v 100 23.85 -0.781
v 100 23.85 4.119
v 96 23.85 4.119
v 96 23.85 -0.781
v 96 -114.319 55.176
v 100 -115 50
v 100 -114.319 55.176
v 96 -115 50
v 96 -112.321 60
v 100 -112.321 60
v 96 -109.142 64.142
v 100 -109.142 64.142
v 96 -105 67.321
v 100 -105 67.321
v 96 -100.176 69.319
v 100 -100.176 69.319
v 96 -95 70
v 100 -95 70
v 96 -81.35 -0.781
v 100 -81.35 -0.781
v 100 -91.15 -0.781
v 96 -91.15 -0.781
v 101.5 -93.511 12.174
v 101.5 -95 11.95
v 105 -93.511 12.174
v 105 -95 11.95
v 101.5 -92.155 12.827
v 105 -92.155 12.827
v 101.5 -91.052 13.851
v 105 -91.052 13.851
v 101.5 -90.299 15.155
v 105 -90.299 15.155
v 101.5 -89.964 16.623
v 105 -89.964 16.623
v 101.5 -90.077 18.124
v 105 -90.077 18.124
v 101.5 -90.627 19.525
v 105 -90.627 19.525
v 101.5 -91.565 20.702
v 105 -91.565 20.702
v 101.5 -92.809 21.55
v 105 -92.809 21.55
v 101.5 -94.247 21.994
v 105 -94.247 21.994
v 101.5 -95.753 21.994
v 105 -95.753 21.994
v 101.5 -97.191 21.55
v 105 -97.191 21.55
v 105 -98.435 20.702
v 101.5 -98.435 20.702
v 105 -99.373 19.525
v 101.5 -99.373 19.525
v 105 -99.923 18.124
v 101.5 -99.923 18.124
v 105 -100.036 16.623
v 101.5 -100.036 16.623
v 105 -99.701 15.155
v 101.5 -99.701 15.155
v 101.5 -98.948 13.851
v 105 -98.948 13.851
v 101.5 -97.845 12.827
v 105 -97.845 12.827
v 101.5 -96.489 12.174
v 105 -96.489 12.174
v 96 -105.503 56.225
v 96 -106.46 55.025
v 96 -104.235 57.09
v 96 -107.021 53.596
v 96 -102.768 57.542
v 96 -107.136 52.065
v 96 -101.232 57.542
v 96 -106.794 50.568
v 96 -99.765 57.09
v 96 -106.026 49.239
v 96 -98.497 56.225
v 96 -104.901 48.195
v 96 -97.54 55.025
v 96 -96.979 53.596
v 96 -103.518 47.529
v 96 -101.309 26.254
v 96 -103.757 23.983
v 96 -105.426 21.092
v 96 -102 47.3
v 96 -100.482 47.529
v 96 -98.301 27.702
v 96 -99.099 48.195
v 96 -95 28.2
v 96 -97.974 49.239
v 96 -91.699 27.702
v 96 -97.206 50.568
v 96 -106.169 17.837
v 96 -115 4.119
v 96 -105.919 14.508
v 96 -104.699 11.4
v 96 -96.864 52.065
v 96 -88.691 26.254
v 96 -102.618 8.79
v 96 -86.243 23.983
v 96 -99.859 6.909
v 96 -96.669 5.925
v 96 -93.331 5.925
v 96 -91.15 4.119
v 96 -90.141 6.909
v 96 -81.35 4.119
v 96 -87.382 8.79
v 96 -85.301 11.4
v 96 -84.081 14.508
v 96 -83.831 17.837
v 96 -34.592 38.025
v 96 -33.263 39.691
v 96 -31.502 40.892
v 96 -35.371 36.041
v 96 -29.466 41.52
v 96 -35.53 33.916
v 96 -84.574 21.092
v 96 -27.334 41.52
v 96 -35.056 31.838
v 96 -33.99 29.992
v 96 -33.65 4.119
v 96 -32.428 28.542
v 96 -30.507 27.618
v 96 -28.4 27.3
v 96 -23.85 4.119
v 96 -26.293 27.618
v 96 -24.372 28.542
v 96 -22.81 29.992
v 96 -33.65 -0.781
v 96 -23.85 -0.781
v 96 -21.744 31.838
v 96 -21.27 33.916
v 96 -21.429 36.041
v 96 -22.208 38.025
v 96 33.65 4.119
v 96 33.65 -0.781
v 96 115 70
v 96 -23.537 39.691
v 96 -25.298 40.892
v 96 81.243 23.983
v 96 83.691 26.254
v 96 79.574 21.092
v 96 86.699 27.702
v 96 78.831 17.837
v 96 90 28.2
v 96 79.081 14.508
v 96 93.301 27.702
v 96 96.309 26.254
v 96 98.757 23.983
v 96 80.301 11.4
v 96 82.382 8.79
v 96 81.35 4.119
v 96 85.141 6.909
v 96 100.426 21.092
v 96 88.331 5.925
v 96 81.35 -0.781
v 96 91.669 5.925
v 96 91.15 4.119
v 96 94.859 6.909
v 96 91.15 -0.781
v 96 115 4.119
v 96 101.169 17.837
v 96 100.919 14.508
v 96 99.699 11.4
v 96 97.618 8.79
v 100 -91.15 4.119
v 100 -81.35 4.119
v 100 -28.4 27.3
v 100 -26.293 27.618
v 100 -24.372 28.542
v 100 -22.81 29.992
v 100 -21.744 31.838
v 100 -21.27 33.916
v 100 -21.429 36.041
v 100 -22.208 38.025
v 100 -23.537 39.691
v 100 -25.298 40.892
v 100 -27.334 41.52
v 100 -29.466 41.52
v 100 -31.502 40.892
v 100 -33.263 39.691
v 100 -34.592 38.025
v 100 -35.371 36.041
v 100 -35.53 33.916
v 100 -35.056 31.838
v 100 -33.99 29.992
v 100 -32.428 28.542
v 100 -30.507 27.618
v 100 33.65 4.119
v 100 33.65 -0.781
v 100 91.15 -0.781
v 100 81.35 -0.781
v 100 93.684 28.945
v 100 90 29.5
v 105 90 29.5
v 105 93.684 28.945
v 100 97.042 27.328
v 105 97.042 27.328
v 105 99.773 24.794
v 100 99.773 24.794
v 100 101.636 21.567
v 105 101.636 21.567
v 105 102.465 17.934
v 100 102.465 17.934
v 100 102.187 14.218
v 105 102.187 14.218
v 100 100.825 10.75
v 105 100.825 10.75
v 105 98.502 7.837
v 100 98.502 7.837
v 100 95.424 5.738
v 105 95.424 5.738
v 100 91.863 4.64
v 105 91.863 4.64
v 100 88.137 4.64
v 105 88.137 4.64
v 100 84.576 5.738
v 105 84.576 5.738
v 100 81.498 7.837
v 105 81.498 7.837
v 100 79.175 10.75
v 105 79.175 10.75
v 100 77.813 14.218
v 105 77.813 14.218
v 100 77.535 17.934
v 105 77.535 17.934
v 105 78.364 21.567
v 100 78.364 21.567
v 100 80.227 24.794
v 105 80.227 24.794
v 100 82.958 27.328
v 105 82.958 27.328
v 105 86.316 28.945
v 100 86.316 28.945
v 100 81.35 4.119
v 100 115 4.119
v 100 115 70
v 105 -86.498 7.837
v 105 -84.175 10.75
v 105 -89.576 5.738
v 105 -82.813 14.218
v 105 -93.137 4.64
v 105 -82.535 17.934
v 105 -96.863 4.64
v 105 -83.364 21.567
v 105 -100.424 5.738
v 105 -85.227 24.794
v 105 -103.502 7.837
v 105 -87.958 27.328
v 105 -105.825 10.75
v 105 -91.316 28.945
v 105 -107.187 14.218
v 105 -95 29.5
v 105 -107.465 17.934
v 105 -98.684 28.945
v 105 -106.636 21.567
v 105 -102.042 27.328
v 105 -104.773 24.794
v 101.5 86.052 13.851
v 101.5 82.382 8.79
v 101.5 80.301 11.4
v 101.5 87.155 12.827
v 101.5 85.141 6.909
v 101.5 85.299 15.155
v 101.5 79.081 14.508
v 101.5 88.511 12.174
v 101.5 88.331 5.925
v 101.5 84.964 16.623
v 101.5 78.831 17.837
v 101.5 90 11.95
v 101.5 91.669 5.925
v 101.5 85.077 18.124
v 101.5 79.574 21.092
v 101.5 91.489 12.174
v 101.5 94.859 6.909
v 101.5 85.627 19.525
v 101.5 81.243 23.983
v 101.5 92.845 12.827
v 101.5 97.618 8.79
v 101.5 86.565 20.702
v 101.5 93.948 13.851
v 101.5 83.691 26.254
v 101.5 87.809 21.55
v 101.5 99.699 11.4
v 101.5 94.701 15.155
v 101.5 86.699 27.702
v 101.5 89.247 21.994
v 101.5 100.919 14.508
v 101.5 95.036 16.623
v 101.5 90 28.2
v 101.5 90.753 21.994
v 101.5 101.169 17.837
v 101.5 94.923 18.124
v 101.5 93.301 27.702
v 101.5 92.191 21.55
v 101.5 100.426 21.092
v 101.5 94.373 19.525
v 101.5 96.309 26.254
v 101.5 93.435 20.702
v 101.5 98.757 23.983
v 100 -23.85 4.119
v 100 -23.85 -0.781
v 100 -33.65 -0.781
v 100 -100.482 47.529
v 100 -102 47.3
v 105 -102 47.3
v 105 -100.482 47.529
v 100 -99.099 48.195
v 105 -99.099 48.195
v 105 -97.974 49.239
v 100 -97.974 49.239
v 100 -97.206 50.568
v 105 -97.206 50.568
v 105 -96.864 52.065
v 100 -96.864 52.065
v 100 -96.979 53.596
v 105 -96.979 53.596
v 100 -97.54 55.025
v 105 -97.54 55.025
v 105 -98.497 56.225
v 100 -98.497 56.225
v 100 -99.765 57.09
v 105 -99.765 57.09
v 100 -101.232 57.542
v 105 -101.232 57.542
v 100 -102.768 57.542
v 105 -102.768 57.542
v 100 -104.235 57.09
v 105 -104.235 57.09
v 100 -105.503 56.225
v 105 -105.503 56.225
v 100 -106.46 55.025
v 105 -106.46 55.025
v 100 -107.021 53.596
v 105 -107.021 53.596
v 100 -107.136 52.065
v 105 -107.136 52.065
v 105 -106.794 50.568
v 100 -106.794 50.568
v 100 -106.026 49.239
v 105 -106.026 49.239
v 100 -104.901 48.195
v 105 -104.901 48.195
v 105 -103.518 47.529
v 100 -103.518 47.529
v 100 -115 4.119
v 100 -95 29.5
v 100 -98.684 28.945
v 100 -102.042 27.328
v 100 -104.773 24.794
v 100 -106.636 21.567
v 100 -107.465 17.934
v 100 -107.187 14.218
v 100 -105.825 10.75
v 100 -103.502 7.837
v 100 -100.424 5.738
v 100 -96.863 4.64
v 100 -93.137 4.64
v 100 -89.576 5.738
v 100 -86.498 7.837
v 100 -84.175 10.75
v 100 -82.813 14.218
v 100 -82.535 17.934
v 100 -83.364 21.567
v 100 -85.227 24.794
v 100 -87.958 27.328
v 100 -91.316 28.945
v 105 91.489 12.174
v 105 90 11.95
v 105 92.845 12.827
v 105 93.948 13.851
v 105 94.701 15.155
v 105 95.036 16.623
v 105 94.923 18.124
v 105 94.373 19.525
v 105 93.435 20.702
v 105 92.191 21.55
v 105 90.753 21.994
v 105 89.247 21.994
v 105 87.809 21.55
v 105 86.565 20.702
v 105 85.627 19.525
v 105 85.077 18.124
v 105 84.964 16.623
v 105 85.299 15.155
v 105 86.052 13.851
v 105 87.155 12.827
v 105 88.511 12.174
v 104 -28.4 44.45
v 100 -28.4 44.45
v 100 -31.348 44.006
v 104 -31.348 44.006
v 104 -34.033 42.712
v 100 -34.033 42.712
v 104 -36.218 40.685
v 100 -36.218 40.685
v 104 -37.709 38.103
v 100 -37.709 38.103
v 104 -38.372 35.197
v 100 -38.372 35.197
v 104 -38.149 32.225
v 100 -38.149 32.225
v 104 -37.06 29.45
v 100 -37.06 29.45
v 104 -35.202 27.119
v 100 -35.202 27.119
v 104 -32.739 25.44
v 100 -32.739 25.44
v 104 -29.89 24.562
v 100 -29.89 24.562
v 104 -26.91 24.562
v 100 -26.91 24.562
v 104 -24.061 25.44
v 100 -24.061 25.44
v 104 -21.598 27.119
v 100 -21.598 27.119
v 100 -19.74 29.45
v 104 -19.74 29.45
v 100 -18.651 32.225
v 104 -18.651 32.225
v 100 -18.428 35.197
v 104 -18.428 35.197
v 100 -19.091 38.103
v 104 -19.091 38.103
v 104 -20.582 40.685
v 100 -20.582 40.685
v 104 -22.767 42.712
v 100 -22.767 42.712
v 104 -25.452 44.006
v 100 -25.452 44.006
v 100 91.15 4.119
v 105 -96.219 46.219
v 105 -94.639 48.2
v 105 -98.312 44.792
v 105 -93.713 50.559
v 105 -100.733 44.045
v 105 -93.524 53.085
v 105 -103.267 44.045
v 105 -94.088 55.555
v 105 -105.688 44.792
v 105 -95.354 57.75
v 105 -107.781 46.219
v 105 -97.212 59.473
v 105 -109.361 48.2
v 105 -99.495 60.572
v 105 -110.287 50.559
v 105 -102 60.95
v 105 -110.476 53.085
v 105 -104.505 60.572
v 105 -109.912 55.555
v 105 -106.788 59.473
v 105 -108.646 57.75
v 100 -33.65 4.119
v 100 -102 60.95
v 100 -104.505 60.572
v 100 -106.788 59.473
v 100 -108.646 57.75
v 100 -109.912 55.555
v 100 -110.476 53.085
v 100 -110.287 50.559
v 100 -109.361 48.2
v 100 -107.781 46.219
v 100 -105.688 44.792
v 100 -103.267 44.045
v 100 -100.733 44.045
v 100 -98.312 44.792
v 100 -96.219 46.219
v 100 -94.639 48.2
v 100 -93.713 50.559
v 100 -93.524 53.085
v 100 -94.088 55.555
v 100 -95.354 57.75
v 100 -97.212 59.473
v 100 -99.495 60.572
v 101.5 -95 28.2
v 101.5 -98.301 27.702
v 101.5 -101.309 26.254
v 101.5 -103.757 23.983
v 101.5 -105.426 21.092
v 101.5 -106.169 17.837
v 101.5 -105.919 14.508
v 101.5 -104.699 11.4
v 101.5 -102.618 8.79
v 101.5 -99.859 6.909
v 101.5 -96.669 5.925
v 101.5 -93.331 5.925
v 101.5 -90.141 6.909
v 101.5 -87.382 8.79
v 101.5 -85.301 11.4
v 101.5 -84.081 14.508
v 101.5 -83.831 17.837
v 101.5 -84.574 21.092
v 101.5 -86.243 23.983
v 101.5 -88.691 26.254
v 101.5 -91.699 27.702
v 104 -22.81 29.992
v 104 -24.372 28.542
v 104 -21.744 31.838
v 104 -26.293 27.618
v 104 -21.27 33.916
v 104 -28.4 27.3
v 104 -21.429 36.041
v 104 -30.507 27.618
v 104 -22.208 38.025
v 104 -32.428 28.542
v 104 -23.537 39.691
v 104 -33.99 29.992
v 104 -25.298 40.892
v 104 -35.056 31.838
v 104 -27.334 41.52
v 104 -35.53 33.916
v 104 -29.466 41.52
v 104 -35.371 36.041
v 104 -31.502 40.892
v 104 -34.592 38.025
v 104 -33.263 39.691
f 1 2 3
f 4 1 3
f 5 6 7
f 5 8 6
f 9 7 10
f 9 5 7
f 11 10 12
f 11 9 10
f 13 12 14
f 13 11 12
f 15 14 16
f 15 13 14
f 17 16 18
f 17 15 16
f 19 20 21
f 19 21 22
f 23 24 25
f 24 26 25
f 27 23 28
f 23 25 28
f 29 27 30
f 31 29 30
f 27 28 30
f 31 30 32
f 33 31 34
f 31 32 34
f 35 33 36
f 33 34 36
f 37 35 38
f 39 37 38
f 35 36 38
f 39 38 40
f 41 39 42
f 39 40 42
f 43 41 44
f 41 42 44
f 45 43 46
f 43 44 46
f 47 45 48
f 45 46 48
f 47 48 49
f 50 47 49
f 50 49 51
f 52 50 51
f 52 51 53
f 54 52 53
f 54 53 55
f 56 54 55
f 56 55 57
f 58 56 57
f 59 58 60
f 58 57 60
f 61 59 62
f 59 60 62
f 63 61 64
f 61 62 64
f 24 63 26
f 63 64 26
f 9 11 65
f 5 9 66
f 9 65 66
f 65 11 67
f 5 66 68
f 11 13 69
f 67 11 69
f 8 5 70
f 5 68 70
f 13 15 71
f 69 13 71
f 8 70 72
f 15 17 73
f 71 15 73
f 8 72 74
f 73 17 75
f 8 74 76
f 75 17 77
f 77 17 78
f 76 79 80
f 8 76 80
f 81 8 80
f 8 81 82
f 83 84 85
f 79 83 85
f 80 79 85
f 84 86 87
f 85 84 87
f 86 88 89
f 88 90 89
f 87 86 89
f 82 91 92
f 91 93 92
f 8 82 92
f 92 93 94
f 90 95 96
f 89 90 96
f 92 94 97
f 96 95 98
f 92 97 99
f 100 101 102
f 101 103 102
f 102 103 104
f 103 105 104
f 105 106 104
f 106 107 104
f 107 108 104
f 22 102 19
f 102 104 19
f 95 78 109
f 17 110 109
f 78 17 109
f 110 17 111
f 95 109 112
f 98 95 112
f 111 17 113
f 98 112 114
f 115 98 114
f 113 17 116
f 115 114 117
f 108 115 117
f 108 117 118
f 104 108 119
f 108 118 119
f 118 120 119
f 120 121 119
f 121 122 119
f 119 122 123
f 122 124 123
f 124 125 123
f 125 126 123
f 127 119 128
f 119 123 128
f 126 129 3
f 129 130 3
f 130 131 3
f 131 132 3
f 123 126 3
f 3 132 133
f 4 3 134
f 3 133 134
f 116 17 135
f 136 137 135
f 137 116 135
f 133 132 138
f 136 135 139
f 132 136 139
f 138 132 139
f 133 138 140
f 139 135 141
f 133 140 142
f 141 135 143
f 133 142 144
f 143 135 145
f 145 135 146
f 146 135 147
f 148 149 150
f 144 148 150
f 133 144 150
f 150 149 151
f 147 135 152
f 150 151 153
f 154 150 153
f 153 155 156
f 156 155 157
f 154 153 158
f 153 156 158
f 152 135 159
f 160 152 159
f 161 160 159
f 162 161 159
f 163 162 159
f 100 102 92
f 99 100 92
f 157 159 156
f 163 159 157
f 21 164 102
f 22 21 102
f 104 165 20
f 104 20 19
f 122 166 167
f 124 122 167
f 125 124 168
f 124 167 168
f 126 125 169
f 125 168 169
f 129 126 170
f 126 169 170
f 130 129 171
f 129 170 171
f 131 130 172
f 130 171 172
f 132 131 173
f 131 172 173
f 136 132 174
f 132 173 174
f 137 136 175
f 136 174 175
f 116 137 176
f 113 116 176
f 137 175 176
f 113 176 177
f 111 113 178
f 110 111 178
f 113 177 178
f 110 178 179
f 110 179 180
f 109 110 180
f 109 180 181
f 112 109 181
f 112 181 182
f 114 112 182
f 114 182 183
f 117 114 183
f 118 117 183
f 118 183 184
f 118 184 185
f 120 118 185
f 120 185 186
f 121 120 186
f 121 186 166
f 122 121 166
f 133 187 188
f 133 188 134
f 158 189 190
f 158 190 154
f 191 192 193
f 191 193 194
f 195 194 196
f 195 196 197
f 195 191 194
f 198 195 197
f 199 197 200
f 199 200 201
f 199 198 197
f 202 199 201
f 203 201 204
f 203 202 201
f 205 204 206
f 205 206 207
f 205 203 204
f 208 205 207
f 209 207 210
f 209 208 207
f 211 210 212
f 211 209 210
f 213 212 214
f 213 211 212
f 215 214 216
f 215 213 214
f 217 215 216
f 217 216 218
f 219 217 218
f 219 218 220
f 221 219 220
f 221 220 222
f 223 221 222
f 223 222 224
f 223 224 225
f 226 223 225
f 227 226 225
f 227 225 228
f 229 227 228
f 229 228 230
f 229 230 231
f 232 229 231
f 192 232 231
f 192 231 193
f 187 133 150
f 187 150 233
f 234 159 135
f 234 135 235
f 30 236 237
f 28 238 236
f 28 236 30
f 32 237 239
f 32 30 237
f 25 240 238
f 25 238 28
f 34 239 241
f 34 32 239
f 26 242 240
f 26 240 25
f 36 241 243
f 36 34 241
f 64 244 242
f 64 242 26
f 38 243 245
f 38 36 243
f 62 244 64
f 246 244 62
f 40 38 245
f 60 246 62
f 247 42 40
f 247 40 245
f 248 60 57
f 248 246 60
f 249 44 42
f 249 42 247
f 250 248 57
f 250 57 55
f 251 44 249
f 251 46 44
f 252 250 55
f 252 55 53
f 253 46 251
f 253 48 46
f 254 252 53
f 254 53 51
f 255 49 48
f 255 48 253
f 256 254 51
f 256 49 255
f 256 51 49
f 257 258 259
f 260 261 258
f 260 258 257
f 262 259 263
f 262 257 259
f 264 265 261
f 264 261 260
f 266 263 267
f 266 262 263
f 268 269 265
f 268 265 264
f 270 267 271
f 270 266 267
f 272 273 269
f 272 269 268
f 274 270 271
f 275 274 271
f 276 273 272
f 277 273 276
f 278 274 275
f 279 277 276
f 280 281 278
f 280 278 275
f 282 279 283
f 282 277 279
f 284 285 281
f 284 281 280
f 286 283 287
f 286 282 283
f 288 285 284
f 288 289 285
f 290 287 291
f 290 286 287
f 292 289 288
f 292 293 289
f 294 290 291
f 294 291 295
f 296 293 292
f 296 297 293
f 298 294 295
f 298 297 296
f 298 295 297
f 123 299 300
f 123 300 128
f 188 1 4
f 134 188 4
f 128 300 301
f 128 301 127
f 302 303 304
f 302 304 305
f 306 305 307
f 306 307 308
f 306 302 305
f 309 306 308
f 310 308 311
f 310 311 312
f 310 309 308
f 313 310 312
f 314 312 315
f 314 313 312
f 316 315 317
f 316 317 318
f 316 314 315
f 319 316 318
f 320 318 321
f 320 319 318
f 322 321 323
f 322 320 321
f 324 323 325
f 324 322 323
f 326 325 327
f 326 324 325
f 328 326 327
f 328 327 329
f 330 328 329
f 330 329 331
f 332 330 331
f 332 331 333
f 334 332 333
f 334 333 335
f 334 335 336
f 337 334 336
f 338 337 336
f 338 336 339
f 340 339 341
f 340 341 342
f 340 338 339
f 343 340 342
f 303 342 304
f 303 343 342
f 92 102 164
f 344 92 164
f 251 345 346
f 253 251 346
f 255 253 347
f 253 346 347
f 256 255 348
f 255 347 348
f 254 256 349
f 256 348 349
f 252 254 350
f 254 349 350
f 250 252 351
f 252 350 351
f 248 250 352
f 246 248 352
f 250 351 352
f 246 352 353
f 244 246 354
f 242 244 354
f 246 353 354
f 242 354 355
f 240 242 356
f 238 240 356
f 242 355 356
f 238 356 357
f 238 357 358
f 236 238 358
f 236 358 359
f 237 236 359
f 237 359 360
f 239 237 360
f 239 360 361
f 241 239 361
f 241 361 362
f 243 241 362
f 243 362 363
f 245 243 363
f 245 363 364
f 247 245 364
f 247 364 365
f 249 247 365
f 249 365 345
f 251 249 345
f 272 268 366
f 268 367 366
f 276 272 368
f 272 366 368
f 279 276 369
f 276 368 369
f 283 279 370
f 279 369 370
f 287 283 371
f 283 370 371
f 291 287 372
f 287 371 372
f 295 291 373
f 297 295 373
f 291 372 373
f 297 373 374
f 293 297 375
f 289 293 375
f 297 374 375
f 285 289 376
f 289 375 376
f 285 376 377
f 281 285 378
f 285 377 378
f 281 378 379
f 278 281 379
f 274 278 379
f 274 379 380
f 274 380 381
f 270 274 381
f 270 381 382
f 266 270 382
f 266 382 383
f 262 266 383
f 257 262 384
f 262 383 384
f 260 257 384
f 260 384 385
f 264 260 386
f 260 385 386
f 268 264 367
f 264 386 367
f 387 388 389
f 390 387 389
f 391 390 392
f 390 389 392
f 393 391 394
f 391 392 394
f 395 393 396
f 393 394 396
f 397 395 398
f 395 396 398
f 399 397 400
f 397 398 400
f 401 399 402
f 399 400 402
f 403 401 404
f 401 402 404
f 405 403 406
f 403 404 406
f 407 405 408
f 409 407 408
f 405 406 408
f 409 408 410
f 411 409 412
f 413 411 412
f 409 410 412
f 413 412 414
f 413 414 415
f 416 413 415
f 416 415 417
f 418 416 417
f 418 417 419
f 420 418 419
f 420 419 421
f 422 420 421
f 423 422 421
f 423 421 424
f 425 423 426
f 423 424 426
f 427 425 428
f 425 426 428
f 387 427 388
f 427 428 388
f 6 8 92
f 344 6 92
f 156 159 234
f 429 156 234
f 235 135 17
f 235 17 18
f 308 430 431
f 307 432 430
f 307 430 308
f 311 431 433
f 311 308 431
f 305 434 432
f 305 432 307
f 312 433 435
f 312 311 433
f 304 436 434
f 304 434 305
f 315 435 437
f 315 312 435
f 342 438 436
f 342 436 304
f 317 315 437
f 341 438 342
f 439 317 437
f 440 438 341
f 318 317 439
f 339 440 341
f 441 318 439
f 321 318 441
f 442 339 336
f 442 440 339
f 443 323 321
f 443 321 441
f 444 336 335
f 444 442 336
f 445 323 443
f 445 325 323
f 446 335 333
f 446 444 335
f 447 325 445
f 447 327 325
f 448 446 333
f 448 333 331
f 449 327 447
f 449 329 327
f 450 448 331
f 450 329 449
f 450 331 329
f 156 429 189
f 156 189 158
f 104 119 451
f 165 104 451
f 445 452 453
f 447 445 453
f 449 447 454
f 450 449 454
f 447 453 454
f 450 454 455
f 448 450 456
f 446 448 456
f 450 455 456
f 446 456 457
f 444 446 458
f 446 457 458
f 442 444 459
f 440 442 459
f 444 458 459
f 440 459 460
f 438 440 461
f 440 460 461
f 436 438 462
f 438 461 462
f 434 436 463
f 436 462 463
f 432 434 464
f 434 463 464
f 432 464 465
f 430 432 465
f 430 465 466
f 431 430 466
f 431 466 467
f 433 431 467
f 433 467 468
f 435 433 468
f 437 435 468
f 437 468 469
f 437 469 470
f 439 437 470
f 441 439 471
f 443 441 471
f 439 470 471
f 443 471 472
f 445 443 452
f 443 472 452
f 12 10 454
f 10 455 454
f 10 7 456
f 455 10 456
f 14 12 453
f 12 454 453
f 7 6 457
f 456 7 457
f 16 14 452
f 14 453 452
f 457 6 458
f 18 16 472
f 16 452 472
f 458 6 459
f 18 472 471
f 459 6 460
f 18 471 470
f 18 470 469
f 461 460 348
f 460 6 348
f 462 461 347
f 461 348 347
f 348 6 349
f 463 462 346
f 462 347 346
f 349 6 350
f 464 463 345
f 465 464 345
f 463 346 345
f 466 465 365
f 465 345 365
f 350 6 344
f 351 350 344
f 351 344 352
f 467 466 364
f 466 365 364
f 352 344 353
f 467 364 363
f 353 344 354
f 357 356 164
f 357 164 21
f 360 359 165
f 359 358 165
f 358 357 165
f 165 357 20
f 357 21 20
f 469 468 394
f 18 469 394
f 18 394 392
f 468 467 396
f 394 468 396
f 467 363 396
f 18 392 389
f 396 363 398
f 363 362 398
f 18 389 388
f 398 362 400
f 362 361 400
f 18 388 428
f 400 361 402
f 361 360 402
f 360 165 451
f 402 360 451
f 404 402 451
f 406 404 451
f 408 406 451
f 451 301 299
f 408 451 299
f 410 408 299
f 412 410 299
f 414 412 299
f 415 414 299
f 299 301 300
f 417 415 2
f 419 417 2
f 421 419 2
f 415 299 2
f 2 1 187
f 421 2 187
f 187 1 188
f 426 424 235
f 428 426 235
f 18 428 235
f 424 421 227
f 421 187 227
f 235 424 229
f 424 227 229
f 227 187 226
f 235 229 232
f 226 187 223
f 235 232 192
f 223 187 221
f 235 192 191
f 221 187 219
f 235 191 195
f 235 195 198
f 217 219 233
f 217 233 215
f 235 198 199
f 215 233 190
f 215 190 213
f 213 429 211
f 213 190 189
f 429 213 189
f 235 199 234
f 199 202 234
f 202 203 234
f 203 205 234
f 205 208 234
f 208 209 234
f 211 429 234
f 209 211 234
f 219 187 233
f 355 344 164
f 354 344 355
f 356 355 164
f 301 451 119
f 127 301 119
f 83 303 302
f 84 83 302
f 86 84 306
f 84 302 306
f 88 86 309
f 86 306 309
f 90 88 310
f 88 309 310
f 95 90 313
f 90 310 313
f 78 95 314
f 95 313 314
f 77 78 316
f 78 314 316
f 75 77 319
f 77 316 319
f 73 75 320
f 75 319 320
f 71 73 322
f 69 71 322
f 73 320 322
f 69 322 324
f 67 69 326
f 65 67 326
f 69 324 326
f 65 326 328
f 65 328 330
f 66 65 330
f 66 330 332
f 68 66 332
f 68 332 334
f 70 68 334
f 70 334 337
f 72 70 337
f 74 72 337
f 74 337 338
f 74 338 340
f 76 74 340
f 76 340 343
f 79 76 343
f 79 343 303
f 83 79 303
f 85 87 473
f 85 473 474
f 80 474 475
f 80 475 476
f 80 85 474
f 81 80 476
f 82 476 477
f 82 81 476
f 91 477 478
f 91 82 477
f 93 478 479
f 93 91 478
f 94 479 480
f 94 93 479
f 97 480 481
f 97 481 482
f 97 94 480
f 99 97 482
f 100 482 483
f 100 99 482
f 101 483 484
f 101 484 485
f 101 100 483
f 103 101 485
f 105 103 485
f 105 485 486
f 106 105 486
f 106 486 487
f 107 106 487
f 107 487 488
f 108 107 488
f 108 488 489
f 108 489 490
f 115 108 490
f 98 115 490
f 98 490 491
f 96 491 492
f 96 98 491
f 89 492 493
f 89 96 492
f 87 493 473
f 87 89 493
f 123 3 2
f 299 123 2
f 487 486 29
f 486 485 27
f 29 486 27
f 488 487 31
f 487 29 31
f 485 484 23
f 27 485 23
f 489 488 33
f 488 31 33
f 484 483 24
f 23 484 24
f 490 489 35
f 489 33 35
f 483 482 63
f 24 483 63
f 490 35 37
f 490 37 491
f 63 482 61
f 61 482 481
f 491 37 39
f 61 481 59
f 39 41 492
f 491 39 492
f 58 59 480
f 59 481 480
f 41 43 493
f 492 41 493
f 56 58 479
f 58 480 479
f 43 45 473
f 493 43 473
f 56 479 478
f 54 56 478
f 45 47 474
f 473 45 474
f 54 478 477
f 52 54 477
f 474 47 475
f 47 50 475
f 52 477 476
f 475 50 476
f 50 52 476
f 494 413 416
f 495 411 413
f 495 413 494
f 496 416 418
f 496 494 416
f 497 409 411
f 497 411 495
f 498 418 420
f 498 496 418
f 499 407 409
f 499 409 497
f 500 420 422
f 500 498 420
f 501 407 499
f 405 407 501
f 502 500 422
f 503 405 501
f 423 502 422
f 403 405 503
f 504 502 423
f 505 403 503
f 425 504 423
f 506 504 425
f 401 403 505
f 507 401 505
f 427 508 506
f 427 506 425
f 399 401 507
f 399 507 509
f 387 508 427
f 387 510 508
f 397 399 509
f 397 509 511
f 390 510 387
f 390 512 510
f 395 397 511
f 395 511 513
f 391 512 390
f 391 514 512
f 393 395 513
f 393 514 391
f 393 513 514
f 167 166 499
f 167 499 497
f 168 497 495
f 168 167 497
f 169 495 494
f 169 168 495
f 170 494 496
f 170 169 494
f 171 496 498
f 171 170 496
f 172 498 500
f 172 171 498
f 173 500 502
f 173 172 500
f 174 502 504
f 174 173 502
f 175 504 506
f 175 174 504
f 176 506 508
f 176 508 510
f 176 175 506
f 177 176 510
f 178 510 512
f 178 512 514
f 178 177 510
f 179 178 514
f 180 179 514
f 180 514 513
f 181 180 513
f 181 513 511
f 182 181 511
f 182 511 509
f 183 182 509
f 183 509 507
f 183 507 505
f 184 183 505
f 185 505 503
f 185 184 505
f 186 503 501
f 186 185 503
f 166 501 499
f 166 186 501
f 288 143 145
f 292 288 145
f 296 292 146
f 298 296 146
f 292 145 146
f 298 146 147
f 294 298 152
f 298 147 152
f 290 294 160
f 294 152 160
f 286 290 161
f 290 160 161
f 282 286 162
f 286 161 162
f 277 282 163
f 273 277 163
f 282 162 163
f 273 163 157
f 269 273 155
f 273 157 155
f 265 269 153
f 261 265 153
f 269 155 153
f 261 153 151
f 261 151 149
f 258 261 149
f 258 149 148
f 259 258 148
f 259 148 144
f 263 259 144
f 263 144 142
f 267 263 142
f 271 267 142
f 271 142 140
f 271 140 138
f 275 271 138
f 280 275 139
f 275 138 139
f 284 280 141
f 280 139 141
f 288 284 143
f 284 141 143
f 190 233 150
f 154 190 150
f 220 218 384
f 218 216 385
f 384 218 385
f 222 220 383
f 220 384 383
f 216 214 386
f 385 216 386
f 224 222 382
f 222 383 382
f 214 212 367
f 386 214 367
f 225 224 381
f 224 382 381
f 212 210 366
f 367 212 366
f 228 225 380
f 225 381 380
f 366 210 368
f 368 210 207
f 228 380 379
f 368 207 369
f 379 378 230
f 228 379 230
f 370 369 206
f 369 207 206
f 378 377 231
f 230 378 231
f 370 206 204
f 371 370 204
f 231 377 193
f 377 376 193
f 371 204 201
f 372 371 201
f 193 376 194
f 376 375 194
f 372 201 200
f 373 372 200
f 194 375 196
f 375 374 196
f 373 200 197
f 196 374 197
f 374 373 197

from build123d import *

# Parameters (mm, degrees)
SKETCH1_W            = 200
SKETCH1_H            = 230
BOSS_EXTRUDE1_DEPTH  = 70
SKETCH2_W            = 192
SKETCH2_H            = 222
CUT_EXTRUDE1_DEPTH   = 66
SKETCH4_W            = 196
SKETCH4_H            = 25
CUT_EXTRUDE3_DEPTH   = 10
SKETCH10_R           = 5
CUT_EXTRUDE8_DEPTH   = 167.075284133
SKETCH11_W           = 2
SKETCH11_H           = 10
BOSS_EXTRUDE2_DEPTH  = 20
SKETCH12_W           = 2
SKETCH12_H           = 5
CUT_EXTRUDE9_DEPTH   = 20
FILLET1_R            = 2.5
SKETCH13_W           = 2
SKETCH13_H           = 10
BOSS_EXTRUDE3_DEPTH  = 20
SKETCH14_W           = 2
SKETCH14_H           = 5
CUT_EXTRUDE10_DEPTH  = 20
FILLET2_R            = 2.5
SKETCH15_W           = 192
SKETCH15_H           = 66
CUT_EXTRUDE11_DEPTH  = 267.458251889
BOSS_EXTRUDE4_DEPTH  = 2
SKETCH18_R           = 7.15
CUT_EXTRUDE12_DEPTH  = 248.638849941
SKETCH19_R           = 5.05
CUT_EXTRUDE13_DEPTH  = 248.638849941
SKETCH20_R           = 5.05
CUT_EXTRUDE14_DEPTH  = 248.638849941
BOSS_EXTRUDE5_START  = 2
BOSS_EXTRUDE5_DEPTH  = 2
SKETCH21_W           = 20
SKETCH21_H           = 10
CUT_EXTRUDE15_DEPTH  = 248.638849941
SKETCH22_W           = 92
SKETCH22_H           = 40
CUT_EXTRUDE16_DEPTH  = 10
SKETCH24_R           = 5.15
CUT_EXTRUDE18_DEPTH  = 242.091269025
FILLET3_R            = 20
FILLET4_R            = 20
SKETCH25_W           = 200
SKETCH25_H           = 4.119110625
CUT_EXTRUDE19_DEPTH  = 261.384331326
SKETCH26_W           = 4
SKETCH26_H           = 65.880889375
CUT_EXTRUDE20_DEPTH  = 261.384331326
SKETCH27_W           = 4
SKETCH27_H           = 9.8
BOSS_EXTRUDE6_DEPTH  = 4.9
SKETCH28_W           = 4
SKETCH28_H           = 9.8
BOSS_EXTRUDE7_DEPTH  = 4.9
SKETCH29_R           = 12.5
SKETCH29_R_2         = 5.05
BOSS_EXTRUDE8_DEPTH  = 9
SKETCH30_R           = 8.5
SKETCH30_R_2         = 5.15
BOSS_EXTRUDE9_DEPTH  = 5
SKETCH32_R           = 10
SKETCH32_R_2         = 7.15
BOSS_EXTRUDE10_DEPTH = 4
SKETCH33_R           = 11.2
CUT_EXTRUDE21_DEPTH  = 5.5


with BuildPart() as part:
    # Sketch1 → Boss-Extrude1 (new body)
    with BuildSketch(Plane.XY):
        Rectangle(SKETCH1_W, SKETCH1_H)
    extrude(amount=BOSS_EXTRUDE1_DEPTH)

    # Sketch2 → Cut-Extrude1 (cut)
    with BuildSketch(Plane.XY.offset(70)):
        Rectangle(SKETCH2_W, SKETCH2_H)
    extrude(amount=-CUT_EXTRUDE1_DEPTH, mode=Mode.SUBTRACT)

    # Sketch4 → Cut-Extrude3 (cut)
    with BuildSketch(Plane.XZ.offset(115)):
        with Locations((0, 57.5)):
            Rectangle(SKETCH4_W, SKETCH4_H)
    extrude(amount=-CUT_EXTRUDE3_DEPTH, mode=Mode.SUBTRACT)

    # Sketch10 → Cut-Extrude8 (cut, through all)
    with BuildSketch(Plane.XY.offset(4)):
        with Locations((0, -11)):
            Circle(SKETCH10_R)
    extrude(amount=-CUT_EXTRUDE8_DEPTH, mode=Mode.SUBTRACT)

    # Sketch11 → Boss-Extrude2 (add)
    with BuildSketch(Plane.XY.offset(70)):
        with Locations((-99, -110)):
            Rectangle(SKETCH11_W, SKETCH11_H)
    extrude(amount=BOSS_EXTRUDE2_DEPTH)

    # Sketch12 → Cut-Extrude9 (cut)
    with BuildSketch(Plane.XY.offset(90)):
        with Locations((-99, -110)):
            Rectangle(SKETCH12_W, SKETCH12_H)
    extrude(amount=-CUT_EXTRUDE9_DEPTH, mode=Mode.SUBTRACT)

    # Fillet1
    fillet1_edges = [part.edges().sort_by_distance(p)[0] for p in [
        (-99, -112.5, 70),
        (-99, -107.5, 70),
    ]]
    fillet(fillet1_edges, radius=FILLET1_R - 0.0001)  # a hair under: the kernel refuses the full size

    # Sketch13 → Boss-Extrude3 (add)
    with BuildSketch(Plane.XY.offset(70)):
        with Locations((99, -110)):
            Rectangle(SKETCH13_W, SKETCH13_H)
    extrude(amount=BOSS_EXTRUDE3_DEPTH)

    # Sketch14 → Cut-Extrude10 (cut)
    with BuildSketch(Plane.XY.offset(90)):
        with Locations((99, -110)):
            Rectangle(SKETCH14_W, SKETCH14_H)
    extrude(amount=-CUT_EXTRUDE10_DEPTH, mode=Mode.SUBTRACT)

    # Fillet2
    fillet2_edges = [part.edges().sort_by_distance(p)[0] for p in [
        (99, -112.5, 70),
        (99, -107.5, 70),
    ]]
    fillet(fillet2_edges, radius=FILLET2_R - 0.0001)  # a hair under: the kernel refuses the full size

    # Sketch15 → Cut-Extrude11 (cut, through all)
    with BuildSketch(Plane(origin=(0, 115, 0), x_dir=(1, 0, 0), z_dir=(0, 1, 0))):
        with Locations((0, -37)):
            Rectangle(SKETCH15_W, SKETCH15_H)
    extrude(amount=-CUT_EXTRUDE11_DEPTH, mode=Mode.SUBTRACT)

    # Sketch16 → Boss-Extrude4 (add)
    with BuildSketch(Plane(origin=(-98, 0, 0), x_dir=(0, 0, -1), z_dir=(1, 0, 0))):
        with BuildLine():
            Line((-90, -107.5), (-72.5, -107.5))
            ThreePointArc((-72.5, -107.5), (-70, -110), (-72.5, -112.5))
            Line((-72.5, -112.5), (-90, -112.5))
            Line((-90, -112.5), (-90, -115))
            Line((-90, -115), (-45, -115))
            Line((-45, -115), (-45, -105))
            Line((-45, -105), (-90, -105))
            Line((-90, -105), (-90, -107.5))
        make_face()
    extrude(amount=BOSS_EXTRUDE4_DEPTH)

    # Sketch18 → Cut-Extrude12 (cut, through all)
    with BuildSketch(Plane(origin=(100, 0, 0), x_dir=(0, 0, -1), z_dir=(1, 0, 0))):
        with Locations((-34.45, -28.4)):
            Circle(SKETCH18_R)
    extrude(amount=-CUT_EXTRUDE12_DEPTH, mode=Mode.SUBTRACT)

    # Sketch19 → Cut-Extrude13 (cut, through all)
    with BuildSketch(Plane(origin=(100, 0, 0), x_dir=(0, 0, -1), z_dir=(1, 0, 0))):
        with Locations((-17, -95)):
            Circle(SKETCH19_R)
    extrude(amount=-CUT_EXTRUDE13_DEPTH, mode=Mode.SUBTRACT)

    # Sketch20 → Cut-Extrude14 (cut, through all)
    with BuildSketch(Plane(origin=(100, 0, 0), x_dir=(0, 0, -1), z_dir=(1, 0, 0))):
        with Locations((-17, 90)):
            Circle(SKETCH20_R)
    extrude(amount=-CUT_EXTRUDE14_DEPTH, mode=Mode.SUBTRACT)

    # Sketch17 → Boss-Extrude5 (add)
    with BuildSketch(Plane.ZY.offset(-98).offset(BOSS_EXTRUDE5_START)):
        with BuildLine():
            Line((90, -107.5), (72.5, -107.5))
            ThreePointArc((72.5, -107.5), (70, -110), (72.5, -112.5))
            Line((72.5, -112.5), (90, -112.5))
            Line((90, -112.5), (90, -115))
            Line((90, -115), (45, -115))
            Line((45, -115), (45, -105))
            Line((45, -105), (90, -105))
            Line((90, -105), (90, -107.5))
        make_face()
    extrude(amount=-BOSS_EXTRUDE5_DEPTH)

    # Sketch21 → Cut-Extrude15 (cut, through all)
    with BuildSketch(Plane(origin=(100, 0, 0), x_dir=(0, 0, -1), z_dir=(1, 0, 0))):
        with Locations((-80, -110)):
            Rectangle(SKETCH21_W, SKETCH21_H)
    extrude(amount=-CUT_EXTRUDE15_DEPTH, mode=Mode.SUBTRACT)

    # Sketch22 → Cut-Extrude16 (cut)
    with BuildSketch(Plane.XY.offset(4)):
        with Locations((0, 95)):
            Rectangle(SKETCH22_W, SKETCH22_H)
    extrude(amount=-CUT_EXTRUDE16_DEPTH, mode=Mode.SUBTRACT)

    # Sketch24 → Cut-Extrude18 (cut, through all)
    with BuildSketch(Plane(origin=(100, 0, 0), x_dir=(0, 0, -1), z_dir=(1, 0, 0))):
        with Locations((-52.45, -102)):
            Circle(SKETCH24_R)
    extrude(amount=-CUT_EXTRUDE18_DEPTH, mode=Mode.SUBTRACT)

    # Fillet3
    fillet3_edges = [part.edges().sort_by_distance(p)[0] for p in [
        (98, -115, 70),
    ]]
    fillet(fillet3_edges, radius=FILLET3_R)

    # Fillet4
    fillet4_edges = [part.edges().sort_by_distance(p)[0] for p in [
        (-98, -115, 70),
    ]]
    fillet(fillet4_edges, radius=FILLET4_R)

    # Sketch25 → Cut-Extrude19 (cut, through all)
    with BuildSketch(Plane(origin=(0, 115, 0), x_dir=(1, 0, 0), z_dir=(0, 1, 0))):
        with Locations((0, -2.059555313)):
            Rectangle(SKETCH25_W, SKETCH25_H)
    extrude(amount=-CUT_EXTRUDE19_DEPTH, mode=Mode.SUBTRACT)


with BuildPart() as cut_extrude19_piece_1:
    # of the separate pieces the step leaves, piece 1, a body of its own (cut_extrude19_pieces)
    add(part.part.solids().sort_by_distance((100, -115, 4.119110625))[0])

    # Sketch27 → Boss-Extrude6 (add)
    with BuildSketch(Plane(origin=(0, 0, 4.119110625), x_dir=(-1, 0, 0), z_dir=(0, 0, -1))):
        with Locations((-98, -86.25)):
            Rectangle(SKETCH27_W, SKETCH27_H)
    boss_extrude6 = extrude(amount=BOSS_EXTRUDE6_DEPTH)

    # Sketch28 → Boss-Extrude7 (add)
    with BuildSketch(Plane(origin=(0, 0, 4.119110625), x_dir=(-1, 0, 0), z_dir=(0, 0, -1))):
        with Locations((-98, -28.75)):
            Rectangle(SKETCH28_W, SKETCH28_H)
    boss_extrude7 = extrude(amount=BOSS_EXTRUDE7_DEPTH)

    # Mirror1: Boss-Extrude6, Boss-Extrude7 across plane
    add(boss_extrude6.mirror(Plane.ZX))
    add(boss_extrude7.mirror(Plane.ZX))

    # Sketch29 → Boss-Extrude8 (add)
    with BuildSketch(Plane.ZY.offset(-96)):
        with Locations((17, 90)):
            Circle(SKETCH29_R)
        with Locations(Location((17, 90, 0), (0, 0, 180))):
            Circle(SKETCH29_R_2, mode=Mode.SUBTRACT)
    boss_extrude8 = extrude(amount=-BOSS_EXTRUDE8_DEPTH)

    # Sketch30 → Boss-Extrude9 (add)
    with BuildSketch(Plane(origin=(100, 0, 0), x_dir=(0, 0, -1), z_dir=(1, 0, 0))):
        with Locations(Location((-52.45, -102, 0), (0, 0, 180))):
            Circle(SKETCH30_R)
        with Locations((-52.45, -102)):
            Circle(SKETCH30_R_2, mode=Mode.SUBTRACT)
    extrude(amount=BOSS_EXTRUDE9_DEPTH)

    # Sketch32 → Boss-Extrude10 (add)
    with BuildSketch(Plane(origin=(100, 0, 0), x_dir=(0, 0, -1), z_dir=(1, 0, 0))):
        with Locations(Location((-34.45, -28.4, 0), (0, 0, 180))):
            Circle(SKETCH32_R)
        with Locations((-34.45, -28.4)):
            Circle(SKETCH32_R_2, mode=Mode.SUBTRACT)
    extrude(amount=BOSS_EXTRUDE10_DEPTH)

    # Sketch33 → Cut-Extrude21 (cut)
    with BuildSketch(Plane.ZY.offset(-96)):
        with Locations((17, 90)):
            Circle(SKETCH33_R)
    cut_extrude21 = extrude(amount=-CUT_EXTRUDE21_DEPTH, mode=Mode.SUBTRACT)

    # Mirror2: Boss-Extrude8, Cut-Extrude21 across plane
    add(boss_extrude8.mirror(Plane.ZX.offset(-2.5)))
    add(cut_extrude21.mirror(Plane.ZX.offset(-2.5)), mode=Mode.SUBTRACT)


with BuildPart() as cut_extrude19_piece_2:
    # of the separate pieces the step leaves, piece 2, a body of its own (cut_extrude19_pieces)
    add(part.part.solids().sort_by_distance((-100, -115, 50))[0])

    # Sketch26 → Cut-Extrude20 (cut, through all)
    with BuildSketch(Plane(origin=(0, 115, 0), x_dir=(1, 0, 0), z_dir=(0, 1, 0))):
        with Locations((-98, -37.059555313)):
            Rectangle(SKETCH26_W, SKETCH26_H)
    extrude(amount=-CUT_EXTRUDE20_DEPTH, mode=Mode.SUBTRACT)


solid = cut_extrude19_piece_1.part
